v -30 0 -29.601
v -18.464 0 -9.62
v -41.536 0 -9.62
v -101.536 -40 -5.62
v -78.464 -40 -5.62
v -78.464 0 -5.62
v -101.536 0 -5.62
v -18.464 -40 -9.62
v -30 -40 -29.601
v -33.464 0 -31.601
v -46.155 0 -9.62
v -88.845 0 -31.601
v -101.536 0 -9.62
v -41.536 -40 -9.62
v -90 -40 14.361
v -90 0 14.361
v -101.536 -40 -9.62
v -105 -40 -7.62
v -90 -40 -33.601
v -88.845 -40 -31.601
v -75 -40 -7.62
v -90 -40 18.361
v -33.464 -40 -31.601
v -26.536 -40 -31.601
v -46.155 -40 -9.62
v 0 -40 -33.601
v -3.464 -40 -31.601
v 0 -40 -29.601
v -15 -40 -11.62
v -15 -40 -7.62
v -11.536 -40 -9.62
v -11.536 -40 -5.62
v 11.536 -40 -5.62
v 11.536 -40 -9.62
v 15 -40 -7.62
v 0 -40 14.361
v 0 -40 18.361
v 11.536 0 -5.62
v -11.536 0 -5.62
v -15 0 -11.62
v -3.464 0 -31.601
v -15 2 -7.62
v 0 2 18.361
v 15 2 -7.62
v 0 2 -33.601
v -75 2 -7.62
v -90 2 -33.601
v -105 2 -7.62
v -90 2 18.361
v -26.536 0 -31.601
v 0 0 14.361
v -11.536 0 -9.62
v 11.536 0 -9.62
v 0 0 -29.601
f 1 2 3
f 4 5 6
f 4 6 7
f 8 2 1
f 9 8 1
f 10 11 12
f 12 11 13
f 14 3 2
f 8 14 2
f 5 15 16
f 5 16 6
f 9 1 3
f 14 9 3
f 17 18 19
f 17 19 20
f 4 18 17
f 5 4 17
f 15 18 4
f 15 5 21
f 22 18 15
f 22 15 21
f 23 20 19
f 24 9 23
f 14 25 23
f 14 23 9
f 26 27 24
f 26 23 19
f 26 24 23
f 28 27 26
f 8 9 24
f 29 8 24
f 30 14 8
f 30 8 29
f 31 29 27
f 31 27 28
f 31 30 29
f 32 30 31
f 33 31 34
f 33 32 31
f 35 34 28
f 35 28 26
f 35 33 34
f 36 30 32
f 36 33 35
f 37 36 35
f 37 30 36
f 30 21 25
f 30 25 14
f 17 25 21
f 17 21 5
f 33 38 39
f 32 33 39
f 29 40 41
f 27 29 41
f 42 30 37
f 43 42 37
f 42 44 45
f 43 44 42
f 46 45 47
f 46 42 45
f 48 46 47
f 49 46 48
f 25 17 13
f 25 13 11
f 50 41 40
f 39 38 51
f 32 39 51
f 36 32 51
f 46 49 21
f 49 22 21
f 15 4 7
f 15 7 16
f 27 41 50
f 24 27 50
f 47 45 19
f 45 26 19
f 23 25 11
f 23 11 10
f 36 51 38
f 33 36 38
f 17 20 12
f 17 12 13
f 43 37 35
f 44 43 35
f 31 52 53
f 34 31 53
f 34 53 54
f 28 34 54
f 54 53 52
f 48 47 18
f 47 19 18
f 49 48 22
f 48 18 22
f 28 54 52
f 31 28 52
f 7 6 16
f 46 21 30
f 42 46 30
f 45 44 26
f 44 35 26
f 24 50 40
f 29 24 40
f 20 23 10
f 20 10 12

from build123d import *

# Parameters (mm, degrees)
F1_DEPTH = 40
F3_DEPTH = 40
F5_DEPTH = 40
F7_DEPTH = 2


with BuildPart() as f1:
    # F0 (on Front) → F1 (new body)
    with BuildSketch(Plane.XZ):
        Polygon((-30, -33.600594), (-15, -7.619832), (-45, -7.619832), align=None)
        Polygon((-18.464102, -9.619832), (-30, -29.600594), (-41.535898, -9.619832), align=None, mode=Mode.SUBTRACT)
        Polygon((0, -33.600594), (-15, -7.619832), (-30, -33.600594), align=None)
        Polygon((-3.464102, -31.600594), (-26.535898, -31.600594), (-15, -11.619832), align=None, mode=Mode.SUBTRACT)
        Polygon((0, -33.600594), (15, -7.619832), (-15, -7.619832), align=None)
        Polygon((-11.535898, -9.619832), (11.535898, -9.619832), (0, -29.600594), align=None, mode=Mode.SUBTRACT)
        Polygon((-15, -7.619832), (15, -7.619832), (0, 18.360931), align=None)
        Polygon((-11.535898, -5.619832), (0, 14.360931), (11.535898, -5.619832), align=None, mode=Mode.SUBTRACT)
    extrude(amount=F1_DEPTH)

    # F2 (on face) → F3 (join)
    with BuildSketch(Plane.XZ.offset(40)):
        Polygon((-30, -33.600594), (-45, -7.619832), (-75, -7.619832), (-105, -7.619832), (-90, -33.600594), align=None)
        Polygon((-33.464102, -31.600594), (-88.845299, -31.600594), (-101.535898, -9.619832), (-75, -9.619832), (-46.154701, -9.619832), align=None, mode=Mode.SUBTRACT)
    extrude(amount=-F3_DEPTH)

    # F4 (on face) → F5 (join)
    with BuildSketch(Plane.XZ.offset(40)):
        Polygon((-75, -7.619832), (-90, 18.360931), (-105, -7.619832), align=None)
        Polygon((-101.535898, -5.619832), (-90, 14.360931), (-78.464102, -5.619832), (-90, -5.619832), align=None, mode=Mode.SUBTRACT)
    extrude(amount=-F5_DEPTH)

    # F6 (on face) → F7 (join)
    with BuildSketch(Plane(origin=(0, 0, 0), x_dir=(-1, 0, 0), z_dir=(0, 1, 0))):
        Polygon((0, 18.360931), (-15, -7.619832), (0, -33.600594), (90, -33.600594), (105, -7.619832), (90, 18.360931), (75, -7.619832), (15, -7.619832), align=None)
    extrude(amount=F7_DEPTH)


solid = f1.part
